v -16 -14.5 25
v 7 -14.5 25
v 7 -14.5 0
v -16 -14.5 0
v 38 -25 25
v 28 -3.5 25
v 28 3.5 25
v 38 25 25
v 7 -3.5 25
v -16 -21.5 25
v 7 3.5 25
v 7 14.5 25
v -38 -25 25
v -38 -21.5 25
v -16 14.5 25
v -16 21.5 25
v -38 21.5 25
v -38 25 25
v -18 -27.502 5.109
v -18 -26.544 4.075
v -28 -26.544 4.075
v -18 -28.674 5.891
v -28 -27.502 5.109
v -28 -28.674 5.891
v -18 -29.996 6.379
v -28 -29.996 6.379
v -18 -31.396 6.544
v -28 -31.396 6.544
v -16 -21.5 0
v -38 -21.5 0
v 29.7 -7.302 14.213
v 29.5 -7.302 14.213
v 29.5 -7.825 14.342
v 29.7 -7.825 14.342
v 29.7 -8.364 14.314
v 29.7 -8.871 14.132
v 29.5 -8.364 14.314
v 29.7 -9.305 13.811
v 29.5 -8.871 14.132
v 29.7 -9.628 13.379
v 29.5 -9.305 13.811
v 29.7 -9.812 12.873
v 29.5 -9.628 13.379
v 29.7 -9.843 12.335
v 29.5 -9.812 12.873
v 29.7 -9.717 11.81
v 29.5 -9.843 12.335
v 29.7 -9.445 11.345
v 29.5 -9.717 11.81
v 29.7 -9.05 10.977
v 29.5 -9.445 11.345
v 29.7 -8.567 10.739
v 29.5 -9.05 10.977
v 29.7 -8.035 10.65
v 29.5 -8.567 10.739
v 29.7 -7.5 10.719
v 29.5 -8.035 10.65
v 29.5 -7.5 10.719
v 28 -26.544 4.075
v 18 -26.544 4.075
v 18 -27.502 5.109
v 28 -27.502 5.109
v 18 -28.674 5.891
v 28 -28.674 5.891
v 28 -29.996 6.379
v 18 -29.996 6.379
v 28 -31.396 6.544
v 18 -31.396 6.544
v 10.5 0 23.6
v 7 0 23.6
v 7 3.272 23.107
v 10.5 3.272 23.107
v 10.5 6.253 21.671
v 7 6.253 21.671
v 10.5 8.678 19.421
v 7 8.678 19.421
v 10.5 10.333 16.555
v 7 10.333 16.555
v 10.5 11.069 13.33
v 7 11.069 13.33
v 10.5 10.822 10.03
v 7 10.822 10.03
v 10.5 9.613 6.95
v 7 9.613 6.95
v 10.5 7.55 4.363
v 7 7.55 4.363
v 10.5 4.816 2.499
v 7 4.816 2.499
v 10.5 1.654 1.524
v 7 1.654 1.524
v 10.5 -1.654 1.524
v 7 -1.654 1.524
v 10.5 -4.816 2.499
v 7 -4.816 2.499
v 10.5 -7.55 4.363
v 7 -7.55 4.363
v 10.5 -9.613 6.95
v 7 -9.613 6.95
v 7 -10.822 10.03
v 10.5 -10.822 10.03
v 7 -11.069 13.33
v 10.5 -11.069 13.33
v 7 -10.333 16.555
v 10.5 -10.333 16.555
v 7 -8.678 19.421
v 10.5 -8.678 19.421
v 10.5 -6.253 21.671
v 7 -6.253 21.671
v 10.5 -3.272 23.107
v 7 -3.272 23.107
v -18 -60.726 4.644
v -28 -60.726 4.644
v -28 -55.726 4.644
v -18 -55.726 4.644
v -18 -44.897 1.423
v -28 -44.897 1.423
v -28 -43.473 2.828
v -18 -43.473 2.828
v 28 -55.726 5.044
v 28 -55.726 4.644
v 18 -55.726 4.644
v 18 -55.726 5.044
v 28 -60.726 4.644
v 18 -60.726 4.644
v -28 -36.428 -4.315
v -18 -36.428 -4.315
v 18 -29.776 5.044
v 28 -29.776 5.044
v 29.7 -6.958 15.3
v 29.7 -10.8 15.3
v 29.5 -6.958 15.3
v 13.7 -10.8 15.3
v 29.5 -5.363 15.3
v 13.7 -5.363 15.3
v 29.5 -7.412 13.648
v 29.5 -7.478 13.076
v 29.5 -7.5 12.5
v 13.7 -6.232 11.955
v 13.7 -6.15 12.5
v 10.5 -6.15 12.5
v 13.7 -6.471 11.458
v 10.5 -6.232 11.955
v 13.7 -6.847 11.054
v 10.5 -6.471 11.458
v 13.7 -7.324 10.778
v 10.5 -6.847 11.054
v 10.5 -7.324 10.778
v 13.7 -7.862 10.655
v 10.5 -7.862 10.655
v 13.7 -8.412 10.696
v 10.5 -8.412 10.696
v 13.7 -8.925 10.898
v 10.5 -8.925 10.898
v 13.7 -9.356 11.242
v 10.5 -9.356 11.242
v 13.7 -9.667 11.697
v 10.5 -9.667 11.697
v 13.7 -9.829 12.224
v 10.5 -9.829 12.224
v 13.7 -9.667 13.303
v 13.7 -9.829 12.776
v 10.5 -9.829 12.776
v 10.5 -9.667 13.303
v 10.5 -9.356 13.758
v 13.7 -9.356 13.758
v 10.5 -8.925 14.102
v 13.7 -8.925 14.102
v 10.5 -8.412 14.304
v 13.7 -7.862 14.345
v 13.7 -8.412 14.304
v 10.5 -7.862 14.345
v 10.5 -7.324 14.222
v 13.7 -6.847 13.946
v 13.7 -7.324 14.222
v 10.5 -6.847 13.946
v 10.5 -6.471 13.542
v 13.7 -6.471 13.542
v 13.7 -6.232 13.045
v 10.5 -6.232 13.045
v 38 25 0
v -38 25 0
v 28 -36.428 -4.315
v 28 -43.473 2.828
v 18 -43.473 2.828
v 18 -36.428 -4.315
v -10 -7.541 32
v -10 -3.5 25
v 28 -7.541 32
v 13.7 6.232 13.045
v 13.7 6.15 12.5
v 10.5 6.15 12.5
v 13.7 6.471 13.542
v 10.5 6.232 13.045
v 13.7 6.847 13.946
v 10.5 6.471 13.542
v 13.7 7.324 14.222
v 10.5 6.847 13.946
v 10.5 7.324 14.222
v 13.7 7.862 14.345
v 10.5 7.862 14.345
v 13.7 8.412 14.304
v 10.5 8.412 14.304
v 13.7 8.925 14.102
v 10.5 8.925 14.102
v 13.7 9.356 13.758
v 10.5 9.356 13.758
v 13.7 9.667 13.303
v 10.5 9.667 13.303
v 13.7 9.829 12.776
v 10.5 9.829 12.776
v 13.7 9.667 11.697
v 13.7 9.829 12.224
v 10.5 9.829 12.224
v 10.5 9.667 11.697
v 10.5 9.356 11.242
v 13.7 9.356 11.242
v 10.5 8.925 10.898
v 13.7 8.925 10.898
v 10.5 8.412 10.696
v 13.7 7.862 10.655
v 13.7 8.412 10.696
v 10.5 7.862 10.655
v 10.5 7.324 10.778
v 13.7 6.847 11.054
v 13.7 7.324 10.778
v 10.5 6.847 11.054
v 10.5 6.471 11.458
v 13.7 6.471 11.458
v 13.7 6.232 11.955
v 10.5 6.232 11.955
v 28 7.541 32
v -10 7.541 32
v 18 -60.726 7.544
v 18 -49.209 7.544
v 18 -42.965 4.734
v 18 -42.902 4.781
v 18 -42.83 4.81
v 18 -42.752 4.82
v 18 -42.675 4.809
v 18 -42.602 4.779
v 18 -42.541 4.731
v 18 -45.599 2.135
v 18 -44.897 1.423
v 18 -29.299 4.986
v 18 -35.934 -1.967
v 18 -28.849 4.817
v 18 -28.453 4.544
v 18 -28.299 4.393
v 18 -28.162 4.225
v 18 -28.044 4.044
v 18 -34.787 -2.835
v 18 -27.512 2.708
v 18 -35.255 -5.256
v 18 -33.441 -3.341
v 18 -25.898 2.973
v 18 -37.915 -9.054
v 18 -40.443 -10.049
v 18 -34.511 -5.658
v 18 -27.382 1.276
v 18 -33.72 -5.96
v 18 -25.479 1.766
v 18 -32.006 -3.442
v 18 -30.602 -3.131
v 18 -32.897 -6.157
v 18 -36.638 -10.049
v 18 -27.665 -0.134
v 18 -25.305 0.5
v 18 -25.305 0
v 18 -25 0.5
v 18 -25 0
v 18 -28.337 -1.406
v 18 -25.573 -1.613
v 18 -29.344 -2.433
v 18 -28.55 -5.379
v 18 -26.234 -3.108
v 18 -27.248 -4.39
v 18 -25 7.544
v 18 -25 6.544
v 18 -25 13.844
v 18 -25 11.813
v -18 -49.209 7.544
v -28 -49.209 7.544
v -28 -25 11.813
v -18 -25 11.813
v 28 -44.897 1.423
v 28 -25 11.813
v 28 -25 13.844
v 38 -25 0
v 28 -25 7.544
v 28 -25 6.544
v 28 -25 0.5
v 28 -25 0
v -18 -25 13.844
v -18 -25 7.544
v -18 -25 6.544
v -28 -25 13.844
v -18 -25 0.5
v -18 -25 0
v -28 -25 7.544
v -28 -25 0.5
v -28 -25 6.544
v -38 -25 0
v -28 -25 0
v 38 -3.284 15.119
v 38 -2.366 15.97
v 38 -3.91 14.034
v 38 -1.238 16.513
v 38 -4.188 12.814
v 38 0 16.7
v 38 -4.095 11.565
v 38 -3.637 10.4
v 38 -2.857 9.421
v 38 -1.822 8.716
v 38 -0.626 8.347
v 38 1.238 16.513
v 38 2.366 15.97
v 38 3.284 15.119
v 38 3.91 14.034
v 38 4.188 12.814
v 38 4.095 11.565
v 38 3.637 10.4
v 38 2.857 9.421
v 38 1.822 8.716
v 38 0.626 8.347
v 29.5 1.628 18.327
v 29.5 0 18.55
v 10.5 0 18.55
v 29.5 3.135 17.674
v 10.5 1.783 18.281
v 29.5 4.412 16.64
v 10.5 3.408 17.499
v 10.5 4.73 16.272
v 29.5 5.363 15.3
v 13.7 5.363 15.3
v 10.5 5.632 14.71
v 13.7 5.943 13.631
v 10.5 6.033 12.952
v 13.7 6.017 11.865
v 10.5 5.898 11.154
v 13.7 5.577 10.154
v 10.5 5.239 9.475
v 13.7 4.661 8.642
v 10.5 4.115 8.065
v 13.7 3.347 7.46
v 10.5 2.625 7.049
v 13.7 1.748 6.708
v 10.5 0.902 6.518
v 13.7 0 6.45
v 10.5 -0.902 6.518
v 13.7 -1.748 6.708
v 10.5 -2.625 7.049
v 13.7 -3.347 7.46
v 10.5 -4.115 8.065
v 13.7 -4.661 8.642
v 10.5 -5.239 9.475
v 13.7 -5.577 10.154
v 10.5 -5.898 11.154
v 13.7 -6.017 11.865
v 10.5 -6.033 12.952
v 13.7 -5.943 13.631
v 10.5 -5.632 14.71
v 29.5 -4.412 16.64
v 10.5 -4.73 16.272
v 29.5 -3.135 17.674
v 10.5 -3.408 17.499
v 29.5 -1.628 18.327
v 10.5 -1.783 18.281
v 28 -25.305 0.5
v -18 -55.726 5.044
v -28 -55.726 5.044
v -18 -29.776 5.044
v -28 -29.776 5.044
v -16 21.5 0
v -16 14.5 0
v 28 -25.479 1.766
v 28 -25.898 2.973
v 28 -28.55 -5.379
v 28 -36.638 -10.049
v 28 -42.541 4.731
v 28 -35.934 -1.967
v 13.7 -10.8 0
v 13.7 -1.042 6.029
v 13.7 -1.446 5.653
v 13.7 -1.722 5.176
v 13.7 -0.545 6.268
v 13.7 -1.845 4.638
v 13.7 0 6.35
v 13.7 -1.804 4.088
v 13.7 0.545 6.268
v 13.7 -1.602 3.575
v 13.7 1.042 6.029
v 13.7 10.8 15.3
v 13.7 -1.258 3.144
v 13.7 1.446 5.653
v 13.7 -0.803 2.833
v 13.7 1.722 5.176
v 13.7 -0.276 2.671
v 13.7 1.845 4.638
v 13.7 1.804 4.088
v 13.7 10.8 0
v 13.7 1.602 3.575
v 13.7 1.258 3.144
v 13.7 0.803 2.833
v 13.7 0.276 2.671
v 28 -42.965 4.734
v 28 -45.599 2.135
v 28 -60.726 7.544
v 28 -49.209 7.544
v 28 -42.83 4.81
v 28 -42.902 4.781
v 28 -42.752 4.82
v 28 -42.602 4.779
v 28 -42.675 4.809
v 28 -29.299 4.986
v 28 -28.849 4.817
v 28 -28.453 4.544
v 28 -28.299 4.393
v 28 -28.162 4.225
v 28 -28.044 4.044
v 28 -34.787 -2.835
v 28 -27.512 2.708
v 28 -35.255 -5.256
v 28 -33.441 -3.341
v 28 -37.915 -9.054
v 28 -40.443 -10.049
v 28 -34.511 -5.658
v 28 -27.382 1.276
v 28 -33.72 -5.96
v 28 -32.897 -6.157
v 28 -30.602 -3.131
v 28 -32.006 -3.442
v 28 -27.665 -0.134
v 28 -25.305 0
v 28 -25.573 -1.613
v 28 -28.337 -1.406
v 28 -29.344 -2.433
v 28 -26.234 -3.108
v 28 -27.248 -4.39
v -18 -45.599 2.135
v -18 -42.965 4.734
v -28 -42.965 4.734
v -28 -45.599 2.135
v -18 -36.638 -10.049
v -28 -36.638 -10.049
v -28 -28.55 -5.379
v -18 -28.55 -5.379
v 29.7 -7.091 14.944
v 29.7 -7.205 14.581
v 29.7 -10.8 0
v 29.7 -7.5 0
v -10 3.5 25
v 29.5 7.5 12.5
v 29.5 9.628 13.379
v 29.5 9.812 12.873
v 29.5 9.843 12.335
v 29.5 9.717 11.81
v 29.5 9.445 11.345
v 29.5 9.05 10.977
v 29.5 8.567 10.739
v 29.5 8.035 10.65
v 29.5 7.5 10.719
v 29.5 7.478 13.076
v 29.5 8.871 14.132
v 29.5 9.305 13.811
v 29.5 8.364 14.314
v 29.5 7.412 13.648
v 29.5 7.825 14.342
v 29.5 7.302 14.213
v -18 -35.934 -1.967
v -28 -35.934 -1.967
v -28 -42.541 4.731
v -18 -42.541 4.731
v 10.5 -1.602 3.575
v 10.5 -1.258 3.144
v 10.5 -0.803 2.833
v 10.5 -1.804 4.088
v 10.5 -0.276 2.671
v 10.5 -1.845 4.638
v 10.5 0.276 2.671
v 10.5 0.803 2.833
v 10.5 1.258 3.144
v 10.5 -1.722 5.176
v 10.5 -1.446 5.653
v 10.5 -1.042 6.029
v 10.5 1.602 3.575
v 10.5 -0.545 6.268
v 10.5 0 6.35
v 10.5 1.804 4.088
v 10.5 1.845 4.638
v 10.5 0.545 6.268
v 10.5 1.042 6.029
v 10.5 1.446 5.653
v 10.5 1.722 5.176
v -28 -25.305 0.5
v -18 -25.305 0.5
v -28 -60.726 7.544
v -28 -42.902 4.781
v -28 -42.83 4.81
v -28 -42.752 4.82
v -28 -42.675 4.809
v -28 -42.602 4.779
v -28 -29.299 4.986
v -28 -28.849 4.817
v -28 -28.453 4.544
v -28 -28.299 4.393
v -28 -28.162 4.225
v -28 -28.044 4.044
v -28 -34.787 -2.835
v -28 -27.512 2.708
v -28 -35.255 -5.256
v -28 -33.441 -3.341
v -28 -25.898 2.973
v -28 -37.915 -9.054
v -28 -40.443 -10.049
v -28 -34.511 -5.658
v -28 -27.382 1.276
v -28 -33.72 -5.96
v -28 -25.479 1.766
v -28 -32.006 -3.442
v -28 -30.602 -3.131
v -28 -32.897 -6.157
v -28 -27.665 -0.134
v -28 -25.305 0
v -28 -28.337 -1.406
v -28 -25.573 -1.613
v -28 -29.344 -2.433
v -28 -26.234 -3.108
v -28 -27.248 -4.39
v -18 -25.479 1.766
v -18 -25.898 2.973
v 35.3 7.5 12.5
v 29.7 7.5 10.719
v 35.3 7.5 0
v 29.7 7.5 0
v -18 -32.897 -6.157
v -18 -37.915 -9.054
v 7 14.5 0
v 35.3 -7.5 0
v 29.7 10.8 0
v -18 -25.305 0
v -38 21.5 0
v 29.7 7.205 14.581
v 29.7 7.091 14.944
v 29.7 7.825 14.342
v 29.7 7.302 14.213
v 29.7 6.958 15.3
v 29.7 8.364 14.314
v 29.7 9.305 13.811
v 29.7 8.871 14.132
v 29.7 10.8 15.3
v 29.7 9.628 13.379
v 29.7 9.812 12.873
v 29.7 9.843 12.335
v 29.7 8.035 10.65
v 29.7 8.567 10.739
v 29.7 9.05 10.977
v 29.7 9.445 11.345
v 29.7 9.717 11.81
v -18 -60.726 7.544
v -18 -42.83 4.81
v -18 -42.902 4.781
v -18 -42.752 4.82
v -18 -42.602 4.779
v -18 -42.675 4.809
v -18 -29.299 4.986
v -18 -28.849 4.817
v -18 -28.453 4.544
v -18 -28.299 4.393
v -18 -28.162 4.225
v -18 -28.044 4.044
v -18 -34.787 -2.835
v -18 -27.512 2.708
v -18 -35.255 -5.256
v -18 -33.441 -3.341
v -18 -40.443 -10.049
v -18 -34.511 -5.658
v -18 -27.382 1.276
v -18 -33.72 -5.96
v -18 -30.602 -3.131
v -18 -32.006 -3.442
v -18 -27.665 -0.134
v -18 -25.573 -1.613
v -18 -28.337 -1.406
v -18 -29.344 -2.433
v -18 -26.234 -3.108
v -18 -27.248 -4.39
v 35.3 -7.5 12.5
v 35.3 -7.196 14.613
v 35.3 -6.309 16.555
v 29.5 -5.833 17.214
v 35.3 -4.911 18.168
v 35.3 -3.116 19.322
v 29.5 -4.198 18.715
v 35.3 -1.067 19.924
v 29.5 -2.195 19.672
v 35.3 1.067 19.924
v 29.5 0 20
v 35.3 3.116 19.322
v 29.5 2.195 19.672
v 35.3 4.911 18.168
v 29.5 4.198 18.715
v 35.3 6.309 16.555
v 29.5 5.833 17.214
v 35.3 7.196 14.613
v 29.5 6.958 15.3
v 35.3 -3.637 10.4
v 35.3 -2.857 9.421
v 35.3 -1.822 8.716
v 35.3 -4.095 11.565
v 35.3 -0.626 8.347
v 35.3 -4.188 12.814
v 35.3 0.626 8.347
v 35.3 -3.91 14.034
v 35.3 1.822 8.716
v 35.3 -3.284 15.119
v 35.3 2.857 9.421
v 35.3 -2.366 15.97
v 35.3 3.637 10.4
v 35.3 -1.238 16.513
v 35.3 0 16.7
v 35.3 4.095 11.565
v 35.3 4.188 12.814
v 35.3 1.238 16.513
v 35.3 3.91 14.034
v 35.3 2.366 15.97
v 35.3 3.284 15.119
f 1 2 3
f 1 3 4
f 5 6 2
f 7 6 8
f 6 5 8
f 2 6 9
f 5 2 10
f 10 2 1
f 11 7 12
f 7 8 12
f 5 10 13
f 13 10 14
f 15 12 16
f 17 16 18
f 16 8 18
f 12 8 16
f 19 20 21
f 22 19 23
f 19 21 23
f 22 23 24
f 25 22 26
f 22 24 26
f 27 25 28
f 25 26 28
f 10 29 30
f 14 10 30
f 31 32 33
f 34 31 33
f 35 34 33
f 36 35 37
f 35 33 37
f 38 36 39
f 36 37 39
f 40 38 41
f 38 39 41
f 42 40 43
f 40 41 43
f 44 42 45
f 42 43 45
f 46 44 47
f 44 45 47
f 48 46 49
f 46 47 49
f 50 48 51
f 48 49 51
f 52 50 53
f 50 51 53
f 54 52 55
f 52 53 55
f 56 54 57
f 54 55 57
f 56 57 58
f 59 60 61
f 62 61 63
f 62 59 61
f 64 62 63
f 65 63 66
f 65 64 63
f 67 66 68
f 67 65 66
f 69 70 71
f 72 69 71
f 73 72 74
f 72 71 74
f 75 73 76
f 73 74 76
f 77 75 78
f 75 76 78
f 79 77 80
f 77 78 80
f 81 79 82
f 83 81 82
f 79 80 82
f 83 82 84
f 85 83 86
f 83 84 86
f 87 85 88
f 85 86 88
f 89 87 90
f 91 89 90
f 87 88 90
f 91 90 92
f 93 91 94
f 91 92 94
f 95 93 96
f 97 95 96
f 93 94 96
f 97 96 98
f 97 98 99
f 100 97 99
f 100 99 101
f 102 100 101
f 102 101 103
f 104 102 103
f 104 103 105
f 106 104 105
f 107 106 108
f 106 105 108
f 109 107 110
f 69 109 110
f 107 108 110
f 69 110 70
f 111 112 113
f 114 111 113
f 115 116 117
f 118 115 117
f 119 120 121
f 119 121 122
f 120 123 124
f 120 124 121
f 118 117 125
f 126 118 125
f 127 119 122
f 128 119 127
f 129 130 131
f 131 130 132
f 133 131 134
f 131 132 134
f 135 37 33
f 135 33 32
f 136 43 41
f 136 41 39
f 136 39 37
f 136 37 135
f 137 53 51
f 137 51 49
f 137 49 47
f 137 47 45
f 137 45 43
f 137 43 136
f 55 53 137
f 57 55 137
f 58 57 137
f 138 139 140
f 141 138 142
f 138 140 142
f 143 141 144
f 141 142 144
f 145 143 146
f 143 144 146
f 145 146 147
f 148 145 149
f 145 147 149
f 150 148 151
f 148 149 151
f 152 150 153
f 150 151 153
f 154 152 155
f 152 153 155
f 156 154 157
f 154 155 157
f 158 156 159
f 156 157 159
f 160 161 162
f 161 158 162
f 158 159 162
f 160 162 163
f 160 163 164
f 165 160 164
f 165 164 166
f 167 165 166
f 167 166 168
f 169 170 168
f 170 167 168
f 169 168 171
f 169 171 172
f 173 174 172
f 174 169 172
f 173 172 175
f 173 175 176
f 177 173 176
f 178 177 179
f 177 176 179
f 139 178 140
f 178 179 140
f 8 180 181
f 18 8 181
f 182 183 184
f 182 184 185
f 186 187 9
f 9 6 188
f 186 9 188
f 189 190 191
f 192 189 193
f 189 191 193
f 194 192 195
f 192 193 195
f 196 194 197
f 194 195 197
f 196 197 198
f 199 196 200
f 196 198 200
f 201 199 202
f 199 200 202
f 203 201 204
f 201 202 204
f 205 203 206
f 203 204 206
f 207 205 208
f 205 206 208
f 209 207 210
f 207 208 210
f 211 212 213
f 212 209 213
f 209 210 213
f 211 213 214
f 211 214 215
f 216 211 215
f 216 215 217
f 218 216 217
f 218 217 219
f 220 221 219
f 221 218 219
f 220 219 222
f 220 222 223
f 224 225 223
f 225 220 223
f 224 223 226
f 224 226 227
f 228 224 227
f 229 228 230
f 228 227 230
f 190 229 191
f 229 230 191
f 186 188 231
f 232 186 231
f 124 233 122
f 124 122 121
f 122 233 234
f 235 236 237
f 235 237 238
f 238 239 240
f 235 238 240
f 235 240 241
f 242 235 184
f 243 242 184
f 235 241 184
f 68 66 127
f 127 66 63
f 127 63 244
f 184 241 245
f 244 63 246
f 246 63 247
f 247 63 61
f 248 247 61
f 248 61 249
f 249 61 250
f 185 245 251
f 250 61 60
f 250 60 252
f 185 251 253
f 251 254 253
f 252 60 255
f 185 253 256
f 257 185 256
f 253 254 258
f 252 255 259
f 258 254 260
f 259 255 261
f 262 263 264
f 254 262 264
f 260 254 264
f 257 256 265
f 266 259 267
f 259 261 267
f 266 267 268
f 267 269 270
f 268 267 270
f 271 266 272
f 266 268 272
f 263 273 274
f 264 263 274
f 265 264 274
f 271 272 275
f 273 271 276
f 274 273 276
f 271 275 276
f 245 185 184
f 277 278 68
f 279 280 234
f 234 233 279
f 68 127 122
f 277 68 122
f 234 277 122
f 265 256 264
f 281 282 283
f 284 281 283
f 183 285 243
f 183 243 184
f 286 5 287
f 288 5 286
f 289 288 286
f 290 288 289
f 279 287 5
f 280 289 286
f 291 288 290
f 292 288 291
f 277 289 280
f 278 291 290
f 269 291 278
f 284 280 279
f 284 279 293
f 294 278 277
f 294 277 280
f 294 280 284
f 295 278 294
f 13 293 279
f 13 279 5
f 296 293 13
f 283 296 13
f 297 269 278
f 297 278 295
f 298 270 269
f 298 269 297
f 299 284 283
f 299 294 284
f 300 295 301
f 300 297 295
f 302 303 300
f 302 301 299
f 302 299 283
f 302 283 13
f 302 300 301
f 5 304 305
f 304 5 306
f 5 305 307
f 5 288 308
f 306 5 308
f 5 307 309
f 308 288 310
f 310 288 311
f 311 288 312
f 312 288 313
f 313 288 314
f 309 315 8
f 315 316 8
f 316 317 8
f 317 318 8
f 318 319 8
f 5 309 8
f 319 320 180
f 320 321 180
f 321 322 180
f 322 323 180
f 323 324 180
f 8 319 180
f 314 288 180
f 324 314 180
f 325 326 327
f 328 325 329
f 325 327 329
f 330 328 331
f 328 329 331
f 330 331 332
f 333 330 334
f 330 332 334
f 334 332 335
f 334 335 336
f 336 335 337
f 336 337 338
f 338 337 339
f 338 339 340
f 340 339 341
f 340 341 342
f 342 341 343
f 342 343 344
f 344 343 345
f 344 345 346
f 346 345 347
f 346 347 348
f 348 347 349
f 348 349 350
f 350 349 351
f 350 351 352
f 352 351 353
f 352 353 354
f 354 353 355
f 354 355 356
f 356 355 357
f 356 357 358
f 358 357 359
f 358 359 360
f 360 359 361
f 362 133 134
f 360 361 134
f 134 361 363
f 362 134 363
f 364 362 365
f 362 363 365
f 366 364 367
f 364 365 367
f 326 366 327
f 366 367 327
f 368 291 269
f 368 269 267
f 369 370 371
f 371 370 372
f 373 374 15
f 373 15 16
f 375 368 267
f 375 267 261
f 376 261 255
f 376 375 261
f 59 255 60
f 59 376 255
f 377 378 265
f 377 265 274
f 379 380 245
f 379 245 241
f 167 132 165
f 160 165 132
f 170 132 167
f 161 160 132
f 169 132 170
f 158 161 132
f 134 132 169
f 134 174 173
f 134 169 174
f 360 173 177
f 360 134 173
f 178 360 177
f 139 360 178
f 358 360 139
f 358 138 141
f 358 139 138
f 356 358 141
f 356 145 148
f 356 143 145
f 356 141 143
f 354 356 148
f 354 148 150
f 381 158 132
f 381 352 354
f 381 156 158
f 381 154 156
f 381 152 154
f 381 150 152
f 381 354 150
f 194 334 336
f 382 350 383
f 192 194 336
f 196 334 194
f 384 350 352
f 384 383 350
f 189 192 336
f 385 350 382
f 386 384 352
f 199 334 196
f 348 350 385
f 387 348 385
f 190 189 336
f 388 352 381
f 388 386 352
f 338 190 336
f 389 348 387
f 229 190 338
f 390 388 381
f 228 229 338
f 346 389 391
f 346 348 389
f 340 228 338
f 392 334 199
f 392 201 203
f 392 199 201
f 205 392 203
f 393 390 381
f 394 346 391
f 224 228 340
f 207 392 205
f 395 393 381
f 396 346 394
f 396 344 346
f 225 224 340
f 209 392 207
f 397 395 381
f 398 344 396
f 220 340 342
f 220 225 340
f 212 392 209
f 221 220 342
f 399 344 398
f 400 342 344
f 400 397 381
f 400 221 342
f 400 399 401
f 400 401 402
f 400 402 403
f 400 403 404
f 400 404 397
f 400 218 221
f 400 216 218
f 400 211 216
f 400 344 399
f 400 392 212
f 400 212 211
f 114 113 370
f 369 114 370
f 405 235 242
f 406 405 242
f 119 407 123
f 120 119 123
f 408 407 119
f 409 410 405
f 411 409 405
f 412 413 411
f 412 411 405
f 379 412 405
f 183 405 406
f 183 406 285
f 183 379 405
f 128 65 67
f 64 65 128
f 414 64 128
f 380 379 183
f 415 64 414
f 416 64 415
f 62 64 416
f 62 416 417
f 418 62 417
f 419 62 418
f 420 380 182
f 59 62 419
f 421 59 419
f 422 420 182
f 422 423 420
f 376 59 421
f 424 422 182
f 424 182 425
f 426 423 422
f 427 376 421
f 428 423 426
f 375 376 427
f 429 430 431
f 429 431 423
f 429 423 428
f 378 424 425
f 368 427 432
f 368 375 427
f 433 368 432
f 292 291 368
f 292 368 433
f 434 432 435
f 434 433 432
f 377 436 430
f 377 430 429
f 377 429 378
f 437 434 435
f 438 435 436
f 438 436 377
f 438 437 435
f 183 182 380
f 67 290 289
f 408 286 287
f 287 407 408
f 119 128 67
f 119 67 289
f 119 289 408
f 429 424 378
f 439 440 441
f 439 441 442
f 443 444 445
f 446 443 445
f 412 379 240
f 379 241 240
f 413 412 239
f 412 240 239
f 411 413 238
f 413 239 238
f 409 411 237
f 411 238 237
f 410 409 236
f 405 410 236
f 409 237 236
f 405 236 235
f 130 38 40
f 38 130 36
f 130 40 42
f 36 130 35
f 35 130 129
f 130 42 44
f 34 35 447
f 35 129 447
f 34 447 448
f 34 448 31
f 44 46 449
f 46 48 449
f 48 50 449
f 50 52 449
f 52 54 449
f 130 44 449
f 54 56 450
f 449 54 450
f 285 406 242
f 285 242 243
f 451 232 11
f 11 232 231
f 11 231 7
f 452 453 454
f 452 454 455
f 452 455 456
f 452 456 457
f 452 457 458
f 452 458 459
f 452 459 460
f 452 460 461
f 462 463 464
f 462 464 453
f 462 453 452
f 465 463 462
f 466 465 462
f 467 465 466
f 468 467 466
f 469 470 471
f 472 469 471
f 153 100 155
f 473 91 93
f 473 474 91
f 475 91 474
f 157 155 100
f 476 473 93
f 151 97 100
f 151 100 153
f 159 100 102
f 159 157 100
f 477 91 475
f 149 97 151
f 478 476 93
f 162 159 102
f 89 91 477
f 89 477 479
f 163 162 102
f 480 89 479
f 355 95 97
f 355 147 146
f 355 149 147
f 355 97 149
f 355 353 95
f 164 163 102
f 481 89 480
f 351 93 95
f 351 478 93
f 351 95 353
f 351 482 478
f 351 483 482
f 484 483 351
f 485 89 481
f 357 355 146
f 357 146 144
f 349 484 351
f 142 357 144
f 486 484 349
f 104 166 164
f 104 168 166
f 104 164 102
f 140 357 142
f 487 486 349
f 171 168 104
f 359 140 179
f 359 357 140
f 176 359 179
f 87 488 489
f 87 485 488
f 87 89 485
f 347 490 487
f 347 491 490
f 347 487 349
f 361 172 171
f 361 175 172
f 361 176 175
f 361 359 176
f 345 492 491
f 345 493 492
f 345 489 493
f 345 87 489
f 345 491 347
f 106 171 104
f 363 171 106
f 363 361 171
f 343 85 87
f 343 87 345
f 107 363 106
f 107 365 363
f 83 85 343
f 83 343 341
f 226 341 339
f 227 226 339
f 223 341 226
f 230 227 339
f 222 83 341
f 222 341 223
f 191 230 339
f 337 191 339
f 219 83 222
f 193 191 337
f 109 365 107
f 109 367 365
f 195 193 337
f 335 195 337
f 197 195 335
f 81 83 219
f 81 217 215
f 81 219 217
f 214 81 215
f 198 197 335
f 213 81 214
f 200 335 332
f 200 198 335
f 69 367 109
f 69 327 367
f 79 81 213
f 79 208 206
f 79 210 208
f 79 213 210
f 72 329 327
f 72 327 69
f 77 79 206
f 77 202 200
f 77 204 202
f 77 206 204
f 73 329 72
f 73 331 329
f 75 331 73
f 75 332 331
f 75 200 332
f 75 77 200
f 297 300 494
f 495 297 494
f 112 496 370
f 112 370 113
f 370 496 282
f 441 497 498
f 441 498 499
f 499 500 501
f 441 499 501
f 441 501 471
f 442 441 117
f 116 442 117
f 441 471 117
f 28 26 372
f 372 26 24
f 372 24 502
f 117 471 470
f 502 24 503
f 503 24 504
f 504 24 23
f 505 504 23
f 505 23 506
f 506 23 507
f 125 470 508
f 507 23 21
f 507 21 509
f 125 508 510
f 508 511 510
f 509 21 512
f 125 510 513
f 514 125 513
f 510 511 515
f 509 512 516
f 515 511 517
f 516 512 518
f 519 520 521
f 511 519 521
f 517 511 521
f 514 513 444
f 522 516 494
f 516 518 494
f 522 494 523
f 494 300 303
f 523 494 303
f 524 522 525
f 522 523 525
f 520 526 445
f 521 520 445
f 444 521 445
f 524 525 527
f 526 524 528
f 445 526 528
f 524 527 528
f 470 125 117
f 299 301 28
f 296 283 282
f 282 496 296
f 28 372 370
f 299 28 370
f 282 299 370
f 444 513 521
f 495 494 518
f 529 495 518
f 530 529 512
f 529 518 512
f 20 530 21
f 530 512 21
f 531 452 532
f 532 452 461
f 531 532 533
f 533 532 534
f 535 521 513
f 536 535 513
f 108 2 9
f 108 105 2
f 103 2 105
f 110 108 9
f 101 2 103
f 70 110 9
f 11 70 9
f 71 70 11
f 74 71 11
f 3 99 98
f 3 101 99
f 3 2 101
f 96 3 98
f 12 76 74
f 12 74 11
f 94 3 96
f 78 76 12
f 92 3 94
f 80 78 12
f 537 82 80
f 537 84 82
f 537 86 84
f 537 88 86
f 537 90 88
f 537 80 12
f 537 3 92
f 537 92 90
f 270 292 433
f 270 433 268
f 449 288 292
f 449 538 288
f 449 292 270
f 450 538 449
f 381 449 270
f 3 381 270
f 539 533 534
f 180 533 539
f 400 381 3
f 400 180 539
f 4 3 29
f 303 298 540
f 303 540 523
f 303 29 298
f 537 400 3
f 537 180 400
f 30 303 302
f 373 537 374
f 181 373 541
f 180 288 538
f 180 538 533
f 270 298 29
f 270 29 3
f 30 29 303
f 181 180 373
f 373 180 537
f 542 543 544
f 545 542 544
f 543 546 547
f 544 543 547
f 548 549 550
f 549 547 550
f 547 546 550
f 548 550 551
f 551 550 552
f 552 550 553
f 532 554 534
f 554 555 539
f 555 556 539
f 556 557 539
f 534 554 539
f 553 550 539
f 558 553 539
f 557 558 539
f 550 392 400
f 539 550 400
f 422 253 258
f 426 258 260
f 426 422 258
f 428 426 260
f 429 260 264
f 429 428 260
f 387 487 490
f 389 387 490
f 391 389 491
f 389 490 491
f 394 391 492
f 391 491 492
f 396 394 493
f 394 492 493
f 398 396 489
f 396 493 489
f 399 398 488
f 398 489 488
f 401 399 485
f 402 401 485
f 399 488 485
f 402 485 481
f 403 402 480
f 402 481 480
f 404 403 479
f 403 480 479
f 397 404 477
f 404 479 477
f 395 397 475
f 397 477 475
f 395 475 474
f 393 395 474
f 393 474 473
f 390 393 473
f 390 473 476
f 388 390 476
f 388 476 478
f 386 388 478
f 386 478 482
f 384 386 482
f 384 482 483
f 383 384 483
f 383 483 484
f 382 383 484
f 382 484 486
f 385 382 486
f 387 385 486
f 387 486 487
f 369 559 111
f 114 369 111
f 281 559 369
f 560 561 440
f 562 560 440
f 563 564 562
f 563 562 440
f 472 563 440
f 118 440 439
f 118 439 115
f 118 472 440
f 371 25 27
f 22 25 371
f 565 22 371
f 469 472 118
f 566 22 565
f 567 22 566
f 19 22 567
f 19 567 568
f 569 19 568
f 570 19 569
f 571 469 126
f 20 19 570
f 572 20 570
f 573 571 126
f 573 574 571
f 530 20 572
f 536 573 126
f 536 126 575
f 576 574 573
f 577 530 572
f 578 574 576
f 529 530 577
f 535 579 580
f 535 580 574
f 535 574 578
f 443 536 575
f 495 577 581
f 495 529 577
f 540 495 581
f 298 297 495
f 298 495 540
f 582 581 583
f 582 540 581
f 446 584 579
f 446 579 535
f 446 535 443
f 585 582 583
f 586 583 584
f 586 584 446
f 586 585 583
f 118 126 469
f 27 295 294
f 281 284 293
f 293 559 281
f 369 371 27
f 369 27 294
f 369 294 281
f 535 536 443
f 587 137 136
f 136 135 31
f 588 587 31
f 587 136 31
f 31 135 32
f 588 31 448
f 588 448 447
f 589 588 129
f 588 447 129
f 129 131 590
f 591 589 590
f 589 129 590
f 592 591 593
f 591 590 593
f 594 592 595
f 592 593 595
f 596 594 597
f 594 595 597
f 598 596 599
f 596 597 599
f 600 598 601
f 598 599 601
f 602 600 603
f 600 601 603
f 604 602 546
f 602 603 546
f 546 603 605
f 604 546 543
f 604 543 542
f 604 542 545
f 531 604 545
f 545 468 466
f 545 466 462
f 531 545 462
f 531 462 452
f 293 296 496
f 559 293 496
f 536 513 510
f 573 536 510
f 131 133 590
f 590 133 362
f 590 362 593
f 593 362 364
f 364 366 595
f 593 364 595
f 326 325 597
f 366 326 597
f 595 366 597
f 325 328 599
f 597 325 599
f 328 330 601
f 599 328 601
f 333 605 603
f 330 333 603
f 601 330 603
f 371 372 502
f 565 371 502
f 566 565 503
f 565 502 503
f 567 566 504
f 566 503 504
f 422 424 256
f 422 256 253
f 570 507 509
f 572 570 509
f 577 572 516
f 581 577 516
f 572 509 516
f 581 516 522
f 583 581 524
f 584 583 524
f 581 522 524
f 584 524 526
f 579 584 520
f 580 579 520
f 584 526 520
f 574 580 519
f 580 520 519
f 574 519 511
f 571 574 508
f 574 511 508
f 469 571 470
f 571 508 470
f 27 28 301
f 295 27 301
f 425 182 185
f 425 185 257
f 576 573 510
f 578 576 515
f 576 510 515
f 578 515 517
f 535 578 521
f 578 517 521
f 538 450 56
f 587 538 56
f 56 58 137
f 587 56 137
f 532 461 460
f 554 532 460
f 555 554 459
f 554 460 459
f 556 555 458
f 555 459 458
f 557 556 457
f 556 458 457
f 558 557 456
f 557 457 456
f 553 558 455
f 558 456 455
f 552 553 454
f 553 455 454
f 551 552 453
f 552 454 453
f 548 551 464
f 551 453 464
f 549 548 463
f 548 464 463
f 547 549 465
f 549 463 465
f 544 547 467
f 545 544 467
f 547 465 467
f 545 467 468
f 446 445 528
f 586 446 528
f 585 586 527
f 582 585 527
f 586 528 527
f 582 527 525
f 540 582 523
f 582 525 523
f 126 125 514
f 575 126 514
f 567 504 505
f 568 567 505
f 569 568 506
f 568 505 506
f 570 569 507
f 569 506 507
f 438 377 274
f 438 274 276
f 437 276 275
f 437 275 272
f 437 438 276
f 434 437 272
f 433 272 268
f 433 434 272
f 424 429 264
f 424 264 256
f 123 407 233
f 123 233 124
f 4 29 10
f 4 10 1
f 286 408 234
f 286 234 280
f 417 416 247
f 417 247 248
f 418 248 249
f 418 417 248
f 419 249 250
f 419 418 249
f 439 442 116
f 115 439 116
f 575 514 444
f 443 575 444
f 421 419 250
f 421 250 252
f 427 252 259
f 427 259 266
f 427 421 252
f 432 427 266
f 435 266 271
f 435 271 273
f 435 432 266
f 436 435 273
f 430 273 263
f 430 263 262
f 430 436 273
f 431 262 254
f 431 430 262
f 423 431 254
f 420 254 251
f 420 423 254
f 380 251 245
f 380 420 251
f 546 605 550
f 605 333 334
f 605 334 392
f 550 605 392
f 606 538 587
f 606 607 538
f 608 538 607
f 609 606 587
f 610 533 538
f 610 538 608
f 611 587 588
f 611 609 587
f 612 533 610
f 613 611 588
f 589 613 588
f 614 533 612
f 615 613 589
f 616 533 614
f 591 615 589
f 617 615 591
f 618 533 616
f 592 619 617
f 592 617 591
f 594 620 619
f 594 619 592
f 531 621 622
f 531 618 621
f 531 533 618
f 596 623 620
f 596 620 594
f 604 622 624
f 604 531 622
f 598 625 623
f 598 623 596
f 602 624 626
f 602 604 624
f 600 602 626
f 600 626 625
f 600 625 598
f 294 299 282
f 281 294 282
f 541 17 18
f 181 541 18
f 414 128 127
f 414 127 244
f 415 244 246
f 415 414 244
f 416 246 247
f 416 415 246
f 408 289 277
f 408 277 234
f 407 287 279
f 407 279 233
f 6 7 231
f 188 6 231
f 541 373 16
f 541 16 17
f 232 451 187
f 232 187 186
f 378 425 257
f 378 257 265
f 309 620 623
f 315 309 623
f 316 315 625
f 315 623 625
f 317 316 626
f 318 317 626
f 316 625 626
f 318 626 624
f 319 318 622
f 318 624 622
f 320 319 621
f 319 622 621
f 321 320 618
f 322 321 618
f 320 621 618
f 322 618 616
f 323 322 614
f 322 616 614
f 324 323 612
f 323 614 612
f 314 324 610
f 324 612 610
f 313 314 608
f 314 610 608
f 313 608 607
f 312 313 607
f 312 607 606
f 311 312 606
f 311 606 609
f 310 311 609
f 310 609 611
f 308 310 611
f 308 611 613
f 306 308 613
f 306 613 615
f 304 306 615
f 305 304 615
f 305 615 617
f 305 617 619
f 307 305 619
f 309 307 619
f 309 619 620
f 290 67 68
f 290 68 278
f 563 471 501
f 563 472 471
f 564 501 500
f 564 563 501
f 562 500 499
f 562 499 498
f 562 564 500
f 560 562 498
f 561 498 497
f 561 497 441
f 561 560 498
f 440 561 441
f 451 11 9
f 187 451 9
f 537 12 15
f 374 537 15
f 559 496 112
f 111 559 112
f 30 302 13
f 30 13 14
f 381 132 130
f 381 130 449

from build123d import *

# Parameters (mm, degrees)
SKETCH1_W                       = 38
SKETCH1_H                       = 50
BOSS_EXTRUDE1_DEPTH             = 25
BOSS_EXTRUDE8_DEPTH             = 10
FILLET1_R                       = 0.3
FILLET1_OF_MIRROR1_R            = 0.3
CUT_EXTRUDE7_REACH              = 77.873
SKETCH15_W                      = 45
SKETCH15_H                      = 29
BOSS_EXTRUDE2_DEPTH             = 38
SKETCH16_R                      = 11.1
CUT_EXTRUDE8_DEPTH              = 3.5
SKETCH17_R                      = 6.05
CUT_EXTRUDE9_DEPTH              = 19
CUT_EXTRUDE10_DEPTH             = 5.8
CUT_EXTRUDE11_START             = -15.8
CUT_EXTRUDE11_DEPTH             = 15.8
SKETCH20_R                      = 1.85
CUT_EXTRUDE12_DEPTH             = 19
CIRPATTERN1_COUNT               = 2
CIRPATTERN1_ANGLE               = 90
CIRPATTERN1_THE_OTHER_WAY_COUNT = 2
CIRPATTERN1_THE_OTHER_WAY_ANGLE = 90
SKETCH24_W                      = 15.3
SKETCH24_H                      = 21.6
SKETCH24_R                      = 1.85
CUT_EXTRUDE13_DEPTH             = 16
SKETCH25_R                      = 4.2
CUT_EXTRUDE14_DEPTH             = 101.421935127
SKETCH27_W                      = 22
SKETCH27_H                      = 43
CUT_EXTRUDE15_DEPTH             = 25


with BuildPart() as part:
    # Sketch1 → Boss-Extrude1 (new body)
    with BuildSketch(Plane.XY):
        with Locations((-19, 0)):
            Rectangle(SKETCH1_W, SKETCH1_H)
    boss_extrude1 = extrude(amount=BOSS_EXTRUDE1_DEPTH)

    # Sketch11 → Boss-Extrude8 (add)
    with BuildSketch(Plane(origin=(-28, 0, 0), x_dir=(0, 0, -1), z_dir=(1, 0, 0))):
        with BuildLine():
            Line((-5.0442209, -55.726230367), (-5.0442209, -29.776230367))
            ThreePointArc((-5.0442209, -29.776230367), (-4.776271708, -28.776230367), (-4.0442209, -28.044179559))
            ThreePointArc((-4.0442209, -28.044179559), (2.432940548, -29.34409424), (1.9670283, -35.933959519))
            Line((1.9670283, -35.933959519), (-4.9442209, -42.751230367))
            Line((-4.9442209, -42.751230367), (-2.13522154, -45.598952719))
            Line((-2.13522154, -45.598952719), (-1.423290952, -44.896702879))
            Line((-1.423290952, -44.896702879), (-2.827790632, -43.472841703))
            Line((-2.827790632, -43.472841703), (4.31462396, -36.427548823))
            Line((4.31462396, -36.427548823), (10.04868827, -40.442583877))
            Line((10.04868827, -40.442583877), (10.04868827, -36.637851334))
            Line((10.04868827, -36.637851334), (5.379165125, -28.55))
            ThreePointArc((5.379165125, -28.55), (3.107671966, -26.234387817), (0, -25.304809472))
            Line((0, -25.304809472), (0, -25))
            Line((0, -25), (-0.5, -25))
            Line((-0.5, -25), (-0.5, -25.304809472))
            ThreePointArc((-0.5, -25.304809472), (-2.379635768, -25.65877443), (-4.074871702, -26.544492749))
            ThreePointArc((-4.074871702, -26.544492749), (-5.891365223, -28.673957334), (-6.5442209, -31.395730211))
            Line((-6.5442209, -31.395730211), (-6.5442209, -25))
            Line((-6.5442209, -25), (-7.5442209, -25))
            Line((-7.5442209, -25), (-7.5442209, -49.208689401))
            Line((-7.5442209, -49.208689401), (-11.812866009, -25))
            Line((-11.812866009, -25), (-13.843719233, -25))
            Line((-13.843719233, -25), (-7.5442209, -60.726230367))
            Line((-7.5442209, -60.726230367), (-4.6442209, -60.726230367))
            Line((-4.6442209, -60.726230367), (-4.6442209, -55.726230367))
            Line((-4.6442209, -55.726230367), (-5.0442209, -55.726230367))
        make_face()
        with BuildLine():
            ThreePointArc((5.255569039, -35.255243777), (5.821779814, -34.120234879), (6.156782985, -32.896873642))
            Line((6.156782985, -32.896873642), (9.053935122, -37.914888341))
            Line((9.053935122, -37.914888341), (5.255569039, -35.255243777))
        make_face(mode=Mode.SUBTRACT)
    boss_extrude8 = extrude(amount=BOSS_EXTRUDE8_DEPTH)

    # Fillet1
    fillet1_edges = [part.edges().sort_by_distance(p)[0] for p in [
        (-23, -42.751230367, 4.9442209),
    ]]
    fillet(fillet1_edges, radius=FILLET1_R)

    # Mirror1: Boss-Extrude1, Boss-Extrude8 across plane
    add(boss_extrude1.mirror(Plane(origin=(0, 0, 0), x_dir=(0, 0, 1), z_dir=(1, 0, 0))))
    add(boss_extrude8.mirror(Plane(origin=(0, 0, 0), x_dir=(0, 0, 1), z_dir=(1, 0, 0))))

    # Fillet1 of Mirror1
    fillet1_of_mirror1_edges = [part.edges().sort_by_distance(p)[0] for p in [
        (23, -42.751230367, 4.9442209),
    ]]
    fillet(fillet1_of_mirror1_edges, radius=FILLET1_OF_MIRROR1_R)

    # Sketch15 → Cut-Extrude7 (cut, up to next)
    with BuildSketch(Plane(origin=(0, 0, 0), x_dir=(-1, 0, 0), z_dir=(0, 0, -1)), mode=Mode.PRIVATE) as cut_extrude7_sk1:
        with Locations((15.5, 0)):
            Rectangle(SKETCH15_W, SKETCH15_H)
    cut_extrude7_tool1 = extrude(cut_extrude7_sk1.sketch, amount=-CUT_EXTRUDE7_REACH, mode=Mode.PRIVATE) & part.part
    add(cut_extrude7_tool1.solids().sort_by_distance((-15.5, 0, 0))[0], mode=Mode.SUBTRACT)

    # Sketch2 → Boss-Extrude2 (add)
    with BuildSketch(Plane.ZY.offset(-28)):
        Polygon((32, 7.541451884), (25, 3.5), (25, -3.5), (32, -7.541451884), align=None)
    extrude(amount=BOSS_EXTRUDE2_DEPTH)

    # Sketch16 → Cut-Extrude8 (cut)
    with BuildSketch(Plane.ZY.offset(-7)):
        with Locations((12.5, 0)):
            Circle(SKETCH16_R)
    extrude(amount=-CUT_EXTRUDE8_DEPTH, mode=Mode.SUBTRACT)

    # Sketch17 → Cut-Extrude9 (cut)
    with BuildSketch(Plane.ZY.offset(-10.5)):
        with Locations((12.5, 0)):
            Circle(SKETCH17_R)
    extrude(amount=-CUT_EXTRUDE9_DEPTH, mode=Mode.SUBTRACT)

    # Sketch18 → Cut-Extrude10 (cut)
    with BuildSketch(Plane.ZY.offset(-29.5)):
        with BuildLine():
            Line((0, -7.5), (12.5, -7.5))
            ThreePointArc((12.5, -7.5), (20, 0), (12.5, 7.5))
            Line((12.5, 7.5), (0, 7.5))
            Line((0, 7.5), (0, -7.5))
        make_face()
    extrude(amount=-CUT_EXTRUDE10_DEPTH, mode=Mode.SUBTRACT)

    # Sketch19 → Cut-Extrude11 (cut)
    with BuildSketch(Plane(origin=(29.5, 0, 0), x_dir=(0, 0, -1), z_dir=(1, 0, 0)).offset(CUT_EXTRUDE11_START)):
        with BuildLine():
            Line((-12.5, 6.05), (0, 6.05))
            Line((0, 6.05), (0, -6.05))
            Line((0, -6.05), (-12.5, -6.05))
            ThreePointArc((-12.5, -6.05), (-18.55, 0), (-12.5, 6.05))
        make_face()
    extrude(amount=CUT_EXTRUDE11_DEPTH, mode=Mode.SUBTRACT)

    # Sketch20 → Cut-Extrude12 (cut)
    with BuildSketch(Plane.ZY.offset(-10.5)):
        with Locations((4.5, 0)):
            Circle(SKETCH20_R)
    cut_extrude12 = extrude(amount=-CUT_EXTRUDE12_DEPTH, mode=Mode.SUBTRACT)

    # CirPattern1: Cut-Extrude12 ×2 about axis
    cirpattern1_axis = Axis((29.5, 0, 12.5), (-1, 0, 0))
    for i in range(1, CIRPATTERN1_COUNT):
        add(cut_extrude12.rotate(cirpattern1_axis, i * CIRPATTERN1_ANGLE / (CIRPATTERN1_COUNT - 1)), mode=Mode.SUBTRACT)

    # CirPattern1 the other way: Cut-Extrude12 ×2 about axis
    cirpattern1_the_other_way_axis = Axis((29.5, 0, 12.5), (1, 0, 0))
    for i in range(1, CIRPATTERN1_THE_OTHER_WAY_COUNT):
        add(cut_extrude12.rotate(cirpattern1_the_other_way_axis, i * CIRPATTERN1_THE_OTHER_WAY_ANGLE / (CIRPATTERN1_THE_OTHER_WAY_COUNT - 1)), mode=Mode.SUBTRACT)

    # Sketch24 → Cut-Extrude13 (cut)
    with BuildSketch(Plane(origin=(13.7, 0, 0), x_dir=(0, 0, -1), z_dir=(1, 0, 0))):
        with Locations((-7.65, 0)):
            Rectangle(SKETCH24_W, SKETCH24_H)
        with Locations((-12.5, -8)):
            Circle(SKETCH24_R, mode=Mode.SUBTRACT)
        with Locations((-12.5, 8)):
            Circle(SKETCH24_R, mode=Mode.SUBTRACT)
    extrude(amount=CUT_EXTRUDE13_DEPTH, mode=Mode.SUBTRACT)

    # Sketch25 → Cut-Extrude14 (cut, through all)
    with BuildSketch(Plane.ZY.offset(-35.3)):
        with Locations((12.5, 0)):
            Circle(SKETCH25_R)
    extrude(amount=-CUT_EXTRUDE14_DEPTH, mode=Mode.SUBTRACT)

    # Sketch27 → Cut-Extrude15 (cut)
    with BuildSketch(Plane(origin=(0, 0, 0), x_dir=(-1, 0, 0), z_dir=(0, 0, -1))):
        with Locations((27, 0)):
            Rectangle(SKETCH27_W, SKETCH27_H)
    extrude(amount=-CUT_EXTRUDE15_DEPTH, mode=Mode.SUBTRACT)


solid = part.part
